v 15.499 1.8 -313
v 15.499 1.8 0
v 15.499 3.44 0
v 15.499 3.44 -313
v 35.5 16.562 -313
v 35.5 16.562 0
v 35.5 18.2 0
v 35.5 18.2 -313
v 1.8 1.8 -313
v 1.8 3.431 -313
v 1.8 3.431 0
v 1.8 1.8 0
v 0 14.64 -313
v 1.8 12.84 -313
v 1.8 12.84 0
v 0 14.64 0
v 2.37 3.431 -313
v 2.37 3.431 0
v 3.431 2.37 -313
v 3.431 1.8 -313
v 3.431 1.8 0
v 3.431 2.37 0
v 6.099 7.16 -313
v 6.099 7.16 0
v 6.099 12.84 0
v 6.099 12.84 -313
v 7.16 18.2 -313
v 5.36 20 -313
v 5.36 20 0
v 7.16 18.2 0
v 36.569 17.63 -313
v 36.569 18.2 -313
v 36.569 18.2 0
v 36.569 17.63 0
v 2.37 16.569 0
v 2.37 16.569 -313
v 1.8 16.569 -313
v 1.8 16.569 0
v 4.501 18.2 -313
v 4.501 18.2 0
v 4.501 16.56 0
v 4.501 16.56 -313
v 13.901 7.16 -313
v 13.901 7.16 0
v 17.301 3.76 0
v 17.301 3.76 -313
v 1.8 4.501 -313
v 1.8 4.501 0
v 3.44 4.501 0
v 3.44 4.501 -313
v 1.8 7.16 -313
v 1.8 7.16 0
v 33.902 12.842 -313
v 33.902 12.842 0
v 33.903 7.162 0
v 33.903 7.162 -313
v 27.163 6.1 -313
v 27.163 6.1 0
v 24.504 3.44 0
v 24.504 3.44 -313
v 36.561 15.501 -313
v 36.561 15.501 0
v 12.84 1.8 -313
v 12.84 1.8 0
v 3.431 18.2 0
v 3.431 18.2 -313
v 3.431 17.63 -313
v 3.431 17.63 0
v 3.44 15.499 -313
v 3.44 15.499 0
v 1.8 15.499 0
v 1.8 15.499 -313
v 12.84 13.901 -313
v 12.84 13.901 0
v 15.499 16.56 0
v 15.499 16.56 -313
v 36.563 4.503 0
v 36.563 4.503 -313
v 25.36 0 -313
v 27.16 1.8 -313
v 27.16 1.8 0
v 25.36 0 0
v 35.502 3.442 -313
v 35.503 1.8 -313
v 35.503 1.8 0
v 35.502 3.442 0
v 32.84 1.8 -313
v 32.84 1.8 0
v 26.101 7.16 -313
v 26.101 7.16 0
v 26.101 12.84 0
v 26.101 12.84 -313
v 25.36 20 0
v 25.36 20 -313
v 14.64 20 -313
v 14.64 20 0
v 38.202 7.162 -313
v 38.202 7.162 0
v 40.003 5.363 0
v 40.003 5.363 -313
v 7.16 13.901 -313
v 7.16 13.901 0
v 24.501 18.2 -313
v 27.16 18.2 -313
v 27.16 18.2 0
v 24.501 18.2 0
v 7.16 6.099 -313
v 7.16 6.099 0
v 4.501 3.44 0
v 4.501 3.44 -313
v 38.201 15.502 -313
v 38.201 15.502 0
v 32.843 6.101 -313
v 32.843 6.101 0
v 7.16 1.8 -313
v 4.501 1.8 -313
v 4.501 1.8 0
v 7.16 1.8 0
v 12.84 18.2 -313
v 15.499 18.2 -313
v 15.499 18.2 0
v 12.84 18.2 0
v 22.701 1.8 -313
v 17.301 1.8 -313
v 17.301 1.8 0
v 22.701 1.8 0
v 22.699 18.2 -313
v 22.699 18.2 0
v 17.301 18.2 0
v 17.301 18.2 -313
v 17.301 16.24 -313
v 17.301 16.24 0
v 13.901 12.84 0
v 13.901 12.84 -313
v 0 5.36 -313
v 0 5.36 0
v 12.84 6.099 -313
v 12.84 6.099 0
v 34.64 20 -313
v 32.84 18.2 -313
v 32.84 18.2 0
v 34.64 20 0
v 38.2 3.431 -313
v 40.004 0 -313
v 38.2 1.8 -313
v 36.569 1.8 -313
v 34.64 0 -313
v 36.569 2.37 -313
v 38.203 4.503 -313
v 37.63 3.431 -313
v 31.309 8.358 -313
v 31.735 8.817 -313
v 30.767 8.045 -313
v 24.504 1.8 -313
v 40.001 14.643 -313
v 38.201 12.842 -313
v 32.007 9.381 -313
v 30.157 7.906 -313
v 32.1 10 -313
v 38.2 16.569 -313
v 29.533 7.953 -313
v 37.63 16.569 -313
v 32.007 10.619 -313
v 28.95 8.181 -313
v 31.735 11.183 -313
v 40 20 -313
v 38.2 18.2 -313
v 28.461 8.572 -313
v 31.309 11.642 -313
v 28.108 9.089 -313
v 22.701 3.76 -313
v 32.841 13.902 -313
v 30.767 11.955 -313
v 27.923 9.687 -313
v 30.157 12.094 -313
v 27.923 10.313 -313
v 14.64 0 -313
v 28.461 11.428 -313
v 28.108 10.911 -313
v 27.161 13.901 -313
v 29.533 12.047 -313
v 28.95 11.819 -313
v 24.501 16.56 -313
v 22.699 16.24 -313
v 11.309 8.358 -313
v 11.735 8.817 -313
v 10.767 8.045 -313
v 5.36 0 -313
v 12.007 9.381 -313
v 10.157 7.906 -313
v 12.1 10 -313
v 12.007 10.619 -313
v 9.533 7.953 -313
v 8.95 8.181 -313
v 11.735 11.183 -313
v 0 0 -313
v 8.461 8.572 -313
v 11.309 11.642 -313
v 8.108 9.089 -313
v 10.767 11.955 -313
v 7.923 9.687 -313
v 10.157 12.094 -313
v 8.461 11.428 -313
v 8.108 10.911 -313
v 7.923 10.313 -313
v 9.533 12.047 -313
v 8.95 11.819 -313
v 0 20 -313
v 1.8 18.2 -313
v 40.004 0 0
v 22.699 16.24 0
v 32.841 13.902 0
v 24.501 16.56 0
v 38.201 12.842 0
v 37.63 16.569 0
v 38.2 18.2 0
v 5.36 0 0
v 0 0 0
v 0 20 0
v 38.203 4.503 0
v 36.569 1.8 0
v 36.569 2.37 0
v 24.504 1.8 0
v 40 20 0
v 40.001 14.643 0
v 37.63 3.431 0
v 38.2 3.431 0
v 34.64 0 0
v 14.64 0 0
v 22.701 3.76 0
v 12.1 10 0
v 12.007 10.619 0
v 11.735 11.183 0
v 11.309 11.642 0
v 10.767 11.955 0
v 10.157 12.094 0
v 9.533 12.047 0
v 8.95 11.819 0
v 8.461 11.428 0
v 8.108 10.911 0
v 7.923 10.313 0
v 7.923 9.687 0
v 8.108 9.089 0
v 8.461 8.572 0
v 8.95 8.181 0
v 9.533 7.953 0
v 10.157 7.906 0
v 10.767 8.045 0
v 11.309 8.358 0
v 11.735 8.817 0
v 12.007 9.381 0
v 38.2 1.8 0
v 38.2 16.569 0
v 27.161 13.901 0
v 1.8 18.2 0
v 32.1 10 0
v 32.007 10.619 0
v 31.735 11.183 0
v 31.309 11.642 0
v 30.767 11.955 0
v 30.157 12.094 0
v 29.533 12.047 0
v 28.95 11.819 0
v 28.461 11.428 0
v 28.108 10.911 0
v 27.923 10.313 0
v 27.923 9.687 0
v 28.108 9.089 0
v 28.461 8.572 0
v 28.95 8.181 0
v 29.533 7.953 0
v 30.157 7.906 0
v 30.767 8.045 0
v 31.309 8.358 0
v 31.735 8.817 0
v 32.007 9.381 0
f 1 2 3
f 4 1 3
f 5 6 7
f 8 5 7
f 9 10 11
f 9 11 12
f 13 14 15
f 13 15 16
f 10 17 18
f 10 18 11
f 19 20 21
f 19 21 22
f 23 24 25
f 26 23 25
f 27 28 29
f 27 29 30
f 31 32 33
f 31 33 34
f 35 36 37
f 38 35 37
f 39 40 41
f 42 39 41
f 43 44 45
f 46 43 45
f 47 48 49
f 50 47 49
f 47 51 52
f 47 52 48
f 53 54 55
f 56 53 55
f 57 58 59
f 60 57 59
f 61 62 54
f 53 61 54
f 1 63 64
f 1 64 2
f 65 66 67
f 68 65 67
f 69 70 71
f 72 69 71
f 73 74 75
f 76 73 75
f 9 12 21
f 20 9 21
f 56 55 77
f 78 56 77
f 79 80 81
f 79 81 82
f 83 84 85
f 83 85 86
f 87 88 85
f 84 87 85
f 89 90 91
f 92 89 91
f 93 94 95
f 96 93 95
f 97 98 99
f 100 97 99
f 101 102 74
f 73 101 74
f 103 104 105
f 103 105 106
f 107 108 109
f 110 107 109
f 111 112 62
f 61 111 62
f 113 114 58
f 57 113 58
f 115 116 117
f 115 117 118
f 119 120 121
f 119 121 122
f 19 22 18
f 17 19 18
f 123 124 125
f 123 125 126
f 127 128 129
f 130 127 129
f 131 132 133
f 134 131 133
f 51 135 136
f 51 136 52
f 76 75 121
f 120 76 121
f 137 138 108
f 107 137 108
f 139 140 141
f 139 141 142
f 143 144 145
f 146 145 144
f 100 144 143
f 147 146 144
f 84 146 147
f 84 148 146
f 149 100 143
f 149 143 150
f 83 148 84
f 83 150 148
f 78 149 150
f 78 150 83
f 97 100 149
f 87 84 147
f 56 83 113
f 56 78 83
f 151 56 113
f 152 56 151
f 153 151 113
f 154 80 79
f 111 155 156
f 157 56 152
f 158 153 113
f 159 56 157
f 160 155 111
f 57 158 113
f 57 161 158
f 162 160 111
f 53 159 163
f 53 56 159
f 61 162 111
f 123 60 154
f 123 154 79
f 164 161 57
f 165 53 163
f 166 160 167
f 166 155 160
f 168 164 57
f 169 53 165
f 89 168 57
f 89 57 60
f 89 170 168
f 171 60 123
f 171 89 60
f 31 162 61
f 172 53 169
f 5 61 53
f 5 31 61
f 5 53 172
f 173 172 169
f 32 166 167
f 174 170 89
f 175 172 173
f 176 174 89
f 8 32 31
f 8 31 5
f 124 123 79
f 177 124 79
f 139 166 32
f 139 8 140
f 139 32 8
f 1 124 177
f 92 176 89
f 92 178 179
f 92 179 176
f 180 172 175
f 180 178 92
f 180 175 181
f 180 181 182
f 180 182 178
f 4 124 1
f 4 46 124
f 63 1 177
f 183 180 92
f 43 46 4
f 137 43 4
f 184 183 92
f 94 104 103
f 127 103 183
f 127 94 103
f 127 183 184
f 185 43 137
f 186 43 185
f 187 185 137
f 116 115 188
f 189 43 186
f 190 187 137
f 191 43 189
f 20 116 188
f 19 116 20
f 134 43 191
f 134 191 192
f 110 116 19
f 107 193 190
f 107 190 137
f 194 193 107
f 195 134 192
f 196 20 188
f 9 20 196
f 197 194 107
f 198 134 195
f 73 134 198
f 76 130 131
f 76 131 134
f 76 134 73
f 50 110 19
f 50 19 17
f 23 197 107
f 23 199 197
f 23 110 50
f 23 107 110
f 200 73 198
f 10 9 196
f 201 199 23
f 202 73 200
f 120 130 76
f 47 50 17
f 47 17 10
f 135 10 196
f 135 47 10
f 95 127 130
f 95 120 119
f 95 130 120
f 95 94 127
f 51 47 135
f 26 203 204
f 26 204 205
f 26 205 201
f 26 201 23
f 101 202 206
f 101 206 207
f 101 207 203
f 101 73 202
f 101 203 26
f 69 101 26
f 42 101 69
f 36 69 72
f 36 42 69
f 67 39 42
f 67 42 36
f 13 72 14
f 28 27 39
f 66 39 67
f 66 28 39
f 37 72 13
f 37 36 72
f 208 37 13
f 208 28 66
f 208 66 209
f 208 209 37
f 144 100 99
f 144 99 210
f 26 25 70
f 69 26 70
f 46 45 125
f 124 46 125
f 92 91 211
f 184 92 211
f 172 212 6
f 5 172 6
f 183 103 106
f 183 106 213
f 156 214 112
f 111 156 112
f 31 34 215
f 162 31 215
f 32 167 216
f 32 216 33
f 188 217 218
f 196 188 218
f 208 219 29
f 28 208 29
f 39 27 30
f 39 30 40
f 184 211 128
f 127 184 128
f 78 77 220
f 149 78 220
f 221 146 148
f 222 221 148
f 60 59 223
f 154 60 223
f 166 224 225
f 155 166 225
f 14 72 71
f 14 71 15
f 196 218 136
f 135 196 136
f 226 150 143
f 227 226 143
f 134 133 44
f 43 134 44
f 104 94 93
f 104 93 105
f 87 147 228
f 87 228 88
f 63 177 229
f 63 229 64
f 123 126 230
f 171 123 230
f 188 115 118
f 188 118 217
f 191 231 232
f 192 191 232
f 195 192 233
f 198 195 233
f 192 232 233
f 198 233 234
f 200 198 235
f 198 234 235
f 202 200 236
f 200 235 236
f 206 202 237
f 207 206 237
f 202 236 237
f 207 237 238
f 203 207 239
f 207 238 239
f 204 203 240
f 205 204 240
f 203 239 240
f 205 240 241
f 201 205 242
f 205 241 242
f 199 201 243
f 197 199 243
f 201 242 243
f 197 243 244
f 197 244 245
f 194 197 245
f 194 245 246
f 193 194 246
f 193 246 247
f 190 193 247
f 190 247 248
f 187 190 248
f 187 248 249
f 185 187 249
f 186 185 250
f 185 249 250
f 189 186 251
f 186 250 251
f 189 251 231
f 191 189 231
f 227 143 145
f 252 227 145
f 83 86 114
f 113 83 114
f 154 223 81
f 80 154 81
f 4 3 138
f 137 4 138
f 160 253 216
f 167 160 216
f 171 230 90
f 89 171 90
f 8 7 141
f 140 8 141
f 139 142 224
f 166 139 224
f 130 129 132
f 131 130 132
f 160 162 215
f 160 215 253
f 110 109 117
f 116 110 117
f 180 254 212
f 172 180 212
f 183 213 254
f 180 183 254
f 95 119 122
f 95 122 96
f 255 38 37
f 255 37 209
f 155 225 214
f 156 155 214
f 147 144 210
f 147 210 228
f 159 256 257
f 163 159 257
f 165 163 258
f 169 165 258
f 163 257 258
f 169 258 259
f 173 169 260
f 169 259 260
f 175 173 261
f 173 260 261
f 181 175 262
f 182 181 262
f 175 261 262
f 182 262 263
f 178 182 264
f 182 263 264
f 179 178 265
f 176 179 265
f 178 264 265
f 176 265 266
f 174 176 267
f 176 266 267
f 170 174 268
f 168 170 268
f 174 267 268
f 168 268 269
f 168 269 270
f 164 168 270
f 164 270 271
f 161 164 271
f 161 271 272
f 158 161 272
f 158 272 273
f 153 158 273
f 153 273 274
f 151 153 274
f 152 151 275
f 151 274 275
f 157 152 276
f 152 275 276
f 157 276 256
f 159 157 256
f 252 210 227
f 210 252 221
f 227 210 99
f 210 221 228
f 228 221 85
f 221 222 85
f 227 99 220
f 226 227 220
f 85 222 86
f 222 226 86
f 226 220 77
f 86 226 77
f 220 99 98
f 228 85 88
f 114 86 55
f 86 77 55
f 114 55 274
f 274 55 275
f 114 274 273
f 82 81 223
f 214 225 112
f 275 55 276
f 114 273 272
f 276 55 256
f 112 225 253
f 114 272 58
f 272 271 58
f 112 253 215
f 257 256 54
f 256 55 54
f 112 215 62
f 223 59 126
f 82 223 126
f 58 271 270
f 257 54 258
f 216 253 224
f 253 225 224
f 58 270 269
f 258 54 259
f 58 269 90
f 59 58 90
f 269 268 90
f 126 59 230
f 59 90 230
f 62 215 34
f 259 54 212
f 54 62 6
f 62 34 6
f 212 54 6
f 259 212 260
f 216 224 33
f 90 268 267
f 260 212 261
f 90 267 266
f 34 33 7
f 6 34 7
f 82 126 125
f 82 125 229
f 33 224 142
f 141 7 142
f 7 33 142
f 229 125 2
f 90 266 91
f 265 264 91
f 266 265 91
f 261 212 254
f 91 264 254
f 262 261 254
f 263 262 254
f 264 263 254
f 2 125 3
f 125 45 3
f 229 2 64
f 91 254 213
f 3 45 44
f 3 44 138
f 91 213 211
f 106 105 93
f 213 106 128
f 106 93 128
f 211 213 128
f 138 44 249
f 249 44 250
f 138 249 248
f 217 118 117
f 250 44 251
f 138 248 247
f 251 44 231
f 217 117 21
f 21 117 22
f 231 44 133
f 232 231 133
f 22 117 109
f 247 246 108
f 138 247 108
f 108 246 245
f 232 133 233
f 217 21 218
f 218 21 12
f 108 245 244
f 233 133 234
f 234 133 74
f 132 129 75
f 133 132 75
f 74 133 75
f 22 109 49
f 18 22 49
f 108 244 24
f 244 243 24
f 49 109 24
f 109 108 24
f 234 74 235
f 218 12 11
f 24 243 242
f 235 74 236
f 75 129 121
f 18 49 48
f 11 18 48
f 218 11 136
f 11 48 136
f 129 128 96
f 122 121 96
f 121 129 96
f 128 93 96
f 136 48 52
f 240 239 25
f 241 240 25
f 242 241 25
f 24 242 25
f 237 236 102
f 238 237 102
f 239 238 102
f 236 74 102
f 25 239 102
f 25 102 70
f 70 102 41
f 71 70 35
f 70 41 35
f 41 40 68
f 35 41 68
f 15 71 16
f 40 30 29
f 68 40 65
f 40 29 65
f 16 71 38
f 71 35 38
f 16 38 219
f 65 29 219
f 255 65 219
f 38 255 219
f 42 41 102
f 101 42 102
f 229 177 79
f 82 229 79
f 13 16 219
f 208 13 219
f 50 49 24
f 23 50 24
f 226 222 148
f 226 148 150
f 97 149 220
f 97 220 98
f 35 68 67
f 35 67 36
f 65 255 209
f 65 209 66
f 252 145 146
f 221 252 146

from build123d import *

# Parameters (mm, degrees)
SKETCH1_R           = 2.1
BOSS_EXTRUDE1_DEPTH = 313


with BuildPart() as part:
    # Sketch1 → Boss-Extrude1 (new body)
    with BuildSketch(Plane.XY):
        Polygon((0, 0), (0, 5.36), (1.8, 7.16), (1.8, 4.500660172), (3.44, 4.500660172), (6.099339828, 7.16), (6.099339828, 12.84), (3.44, 15.499339828), (1.8, 15.499339828), (1.8, 12.84), (0, 14.64), (0, 20), (5.36, 20), (7.16, 18.2), (4.500660172, 18.2), (4.500660172, 16.56), (7.16, 13.900660172), (12.84, 13.900660172), (15.499339828, 16.56), (15.499339828, 18.2), (12.84, 18.2), (14.64, 20), (20, 20), (25.36, 20), (27.16, 18.2), (24.500939946, 18.2), (24.50125838, 16.559689577), (27.161114417, 13.900866058), (32.84111431, 13.901968719), (35.499937829, 16.561824756), (35.49961981, 18.2), (32.84, 18.2), (34.64, 20), (39.999930631, 20), (40.000970647, 14.642698508), (38.201320116, 12.842349107), (38.200803857, 15.501688885), (36.560803888, 15.501370511), (33.901980368, 12.841514474), (33.903083029, 7.161514581), (36.562939066, 4.502691062), (38.202939036, 4.503009436), (38.202422777, 7.162349214), (40.002772178, 5.362698683), (40.003813241, 0), (34.64, 0), (32.84, 1.8), (35.502803549, 1.8), (35.502484821, 3.441825004), (32.842628784, 6.100648523), (27.162628891, 6.099545862), (24.503805372, 3.439689825), (24.504123686, 1.8), (27.16, 1.8), (25.36, 0), (20, 0), (14.64, 0), (12.84, 1.8), (15.499339828, 1.8), (15.499339828, 3.44), (12.84, 6.099339828), (7.16, 6.099339828), (4.500660172, 3.44), (4.500660172, 1.8), (7.16, 1.8), (5.36, 0), align=None)
        with Locations((10, 10)):
            Circle(SKETCH1_R, mode=Mode.SUBTRACT)
        with Locations((30, 10)):
            Circle(SKETCH1_R, mode=Mode.SUBTRACT)
        Polygon((17.300660172, 3.76), (17.300660172, 1.8), (22.700660172, 1.8), (22.700660172, 3.76), (26.100660172, 7.16), (26.100660172, 12.84), (22.699339828, 16.24), (22.699339828, 18.2), (17.300660172, 18.2), (17.300660172, 16.24), (13.900660172, 12.84), (13.900660172, 7.16), align=None, mode=Mode.SUBTRACT)
        Polygon((1.8, 18.2), (3.430660172, 18.2), (3.430660172, 17.63), (2.37, 16.569339828), (1.8, 16.569339828), align=None, mode=Mode.SUBTRACT)
        Polygon((1.8, 3.430660172), (1.8, 1.8), (3.430660172, 1.8), (3.430660172, 2.37), (2.37, 3.430660172), align=None, mode=Mode.SUBTRACT)
        Polygon((38.2, 1.8), (36.569339828, 1.8), (36.569339828, 2.37), (37.63, 3.430660172), (38.2, 3.430660172), align=None, mode=Mode.SUBTRACT)
        Polygon((38.2, 16.569339828), (38.2, 18.2), (36.569339828, 18.2), (36.569339828, 17.63), (37.63, 16.569339828), align=None, mode=Mode.SUBTRACT)
    extrude(amount=-BOSS_EXTRUDE1_DEPTH)


solid = part.part
